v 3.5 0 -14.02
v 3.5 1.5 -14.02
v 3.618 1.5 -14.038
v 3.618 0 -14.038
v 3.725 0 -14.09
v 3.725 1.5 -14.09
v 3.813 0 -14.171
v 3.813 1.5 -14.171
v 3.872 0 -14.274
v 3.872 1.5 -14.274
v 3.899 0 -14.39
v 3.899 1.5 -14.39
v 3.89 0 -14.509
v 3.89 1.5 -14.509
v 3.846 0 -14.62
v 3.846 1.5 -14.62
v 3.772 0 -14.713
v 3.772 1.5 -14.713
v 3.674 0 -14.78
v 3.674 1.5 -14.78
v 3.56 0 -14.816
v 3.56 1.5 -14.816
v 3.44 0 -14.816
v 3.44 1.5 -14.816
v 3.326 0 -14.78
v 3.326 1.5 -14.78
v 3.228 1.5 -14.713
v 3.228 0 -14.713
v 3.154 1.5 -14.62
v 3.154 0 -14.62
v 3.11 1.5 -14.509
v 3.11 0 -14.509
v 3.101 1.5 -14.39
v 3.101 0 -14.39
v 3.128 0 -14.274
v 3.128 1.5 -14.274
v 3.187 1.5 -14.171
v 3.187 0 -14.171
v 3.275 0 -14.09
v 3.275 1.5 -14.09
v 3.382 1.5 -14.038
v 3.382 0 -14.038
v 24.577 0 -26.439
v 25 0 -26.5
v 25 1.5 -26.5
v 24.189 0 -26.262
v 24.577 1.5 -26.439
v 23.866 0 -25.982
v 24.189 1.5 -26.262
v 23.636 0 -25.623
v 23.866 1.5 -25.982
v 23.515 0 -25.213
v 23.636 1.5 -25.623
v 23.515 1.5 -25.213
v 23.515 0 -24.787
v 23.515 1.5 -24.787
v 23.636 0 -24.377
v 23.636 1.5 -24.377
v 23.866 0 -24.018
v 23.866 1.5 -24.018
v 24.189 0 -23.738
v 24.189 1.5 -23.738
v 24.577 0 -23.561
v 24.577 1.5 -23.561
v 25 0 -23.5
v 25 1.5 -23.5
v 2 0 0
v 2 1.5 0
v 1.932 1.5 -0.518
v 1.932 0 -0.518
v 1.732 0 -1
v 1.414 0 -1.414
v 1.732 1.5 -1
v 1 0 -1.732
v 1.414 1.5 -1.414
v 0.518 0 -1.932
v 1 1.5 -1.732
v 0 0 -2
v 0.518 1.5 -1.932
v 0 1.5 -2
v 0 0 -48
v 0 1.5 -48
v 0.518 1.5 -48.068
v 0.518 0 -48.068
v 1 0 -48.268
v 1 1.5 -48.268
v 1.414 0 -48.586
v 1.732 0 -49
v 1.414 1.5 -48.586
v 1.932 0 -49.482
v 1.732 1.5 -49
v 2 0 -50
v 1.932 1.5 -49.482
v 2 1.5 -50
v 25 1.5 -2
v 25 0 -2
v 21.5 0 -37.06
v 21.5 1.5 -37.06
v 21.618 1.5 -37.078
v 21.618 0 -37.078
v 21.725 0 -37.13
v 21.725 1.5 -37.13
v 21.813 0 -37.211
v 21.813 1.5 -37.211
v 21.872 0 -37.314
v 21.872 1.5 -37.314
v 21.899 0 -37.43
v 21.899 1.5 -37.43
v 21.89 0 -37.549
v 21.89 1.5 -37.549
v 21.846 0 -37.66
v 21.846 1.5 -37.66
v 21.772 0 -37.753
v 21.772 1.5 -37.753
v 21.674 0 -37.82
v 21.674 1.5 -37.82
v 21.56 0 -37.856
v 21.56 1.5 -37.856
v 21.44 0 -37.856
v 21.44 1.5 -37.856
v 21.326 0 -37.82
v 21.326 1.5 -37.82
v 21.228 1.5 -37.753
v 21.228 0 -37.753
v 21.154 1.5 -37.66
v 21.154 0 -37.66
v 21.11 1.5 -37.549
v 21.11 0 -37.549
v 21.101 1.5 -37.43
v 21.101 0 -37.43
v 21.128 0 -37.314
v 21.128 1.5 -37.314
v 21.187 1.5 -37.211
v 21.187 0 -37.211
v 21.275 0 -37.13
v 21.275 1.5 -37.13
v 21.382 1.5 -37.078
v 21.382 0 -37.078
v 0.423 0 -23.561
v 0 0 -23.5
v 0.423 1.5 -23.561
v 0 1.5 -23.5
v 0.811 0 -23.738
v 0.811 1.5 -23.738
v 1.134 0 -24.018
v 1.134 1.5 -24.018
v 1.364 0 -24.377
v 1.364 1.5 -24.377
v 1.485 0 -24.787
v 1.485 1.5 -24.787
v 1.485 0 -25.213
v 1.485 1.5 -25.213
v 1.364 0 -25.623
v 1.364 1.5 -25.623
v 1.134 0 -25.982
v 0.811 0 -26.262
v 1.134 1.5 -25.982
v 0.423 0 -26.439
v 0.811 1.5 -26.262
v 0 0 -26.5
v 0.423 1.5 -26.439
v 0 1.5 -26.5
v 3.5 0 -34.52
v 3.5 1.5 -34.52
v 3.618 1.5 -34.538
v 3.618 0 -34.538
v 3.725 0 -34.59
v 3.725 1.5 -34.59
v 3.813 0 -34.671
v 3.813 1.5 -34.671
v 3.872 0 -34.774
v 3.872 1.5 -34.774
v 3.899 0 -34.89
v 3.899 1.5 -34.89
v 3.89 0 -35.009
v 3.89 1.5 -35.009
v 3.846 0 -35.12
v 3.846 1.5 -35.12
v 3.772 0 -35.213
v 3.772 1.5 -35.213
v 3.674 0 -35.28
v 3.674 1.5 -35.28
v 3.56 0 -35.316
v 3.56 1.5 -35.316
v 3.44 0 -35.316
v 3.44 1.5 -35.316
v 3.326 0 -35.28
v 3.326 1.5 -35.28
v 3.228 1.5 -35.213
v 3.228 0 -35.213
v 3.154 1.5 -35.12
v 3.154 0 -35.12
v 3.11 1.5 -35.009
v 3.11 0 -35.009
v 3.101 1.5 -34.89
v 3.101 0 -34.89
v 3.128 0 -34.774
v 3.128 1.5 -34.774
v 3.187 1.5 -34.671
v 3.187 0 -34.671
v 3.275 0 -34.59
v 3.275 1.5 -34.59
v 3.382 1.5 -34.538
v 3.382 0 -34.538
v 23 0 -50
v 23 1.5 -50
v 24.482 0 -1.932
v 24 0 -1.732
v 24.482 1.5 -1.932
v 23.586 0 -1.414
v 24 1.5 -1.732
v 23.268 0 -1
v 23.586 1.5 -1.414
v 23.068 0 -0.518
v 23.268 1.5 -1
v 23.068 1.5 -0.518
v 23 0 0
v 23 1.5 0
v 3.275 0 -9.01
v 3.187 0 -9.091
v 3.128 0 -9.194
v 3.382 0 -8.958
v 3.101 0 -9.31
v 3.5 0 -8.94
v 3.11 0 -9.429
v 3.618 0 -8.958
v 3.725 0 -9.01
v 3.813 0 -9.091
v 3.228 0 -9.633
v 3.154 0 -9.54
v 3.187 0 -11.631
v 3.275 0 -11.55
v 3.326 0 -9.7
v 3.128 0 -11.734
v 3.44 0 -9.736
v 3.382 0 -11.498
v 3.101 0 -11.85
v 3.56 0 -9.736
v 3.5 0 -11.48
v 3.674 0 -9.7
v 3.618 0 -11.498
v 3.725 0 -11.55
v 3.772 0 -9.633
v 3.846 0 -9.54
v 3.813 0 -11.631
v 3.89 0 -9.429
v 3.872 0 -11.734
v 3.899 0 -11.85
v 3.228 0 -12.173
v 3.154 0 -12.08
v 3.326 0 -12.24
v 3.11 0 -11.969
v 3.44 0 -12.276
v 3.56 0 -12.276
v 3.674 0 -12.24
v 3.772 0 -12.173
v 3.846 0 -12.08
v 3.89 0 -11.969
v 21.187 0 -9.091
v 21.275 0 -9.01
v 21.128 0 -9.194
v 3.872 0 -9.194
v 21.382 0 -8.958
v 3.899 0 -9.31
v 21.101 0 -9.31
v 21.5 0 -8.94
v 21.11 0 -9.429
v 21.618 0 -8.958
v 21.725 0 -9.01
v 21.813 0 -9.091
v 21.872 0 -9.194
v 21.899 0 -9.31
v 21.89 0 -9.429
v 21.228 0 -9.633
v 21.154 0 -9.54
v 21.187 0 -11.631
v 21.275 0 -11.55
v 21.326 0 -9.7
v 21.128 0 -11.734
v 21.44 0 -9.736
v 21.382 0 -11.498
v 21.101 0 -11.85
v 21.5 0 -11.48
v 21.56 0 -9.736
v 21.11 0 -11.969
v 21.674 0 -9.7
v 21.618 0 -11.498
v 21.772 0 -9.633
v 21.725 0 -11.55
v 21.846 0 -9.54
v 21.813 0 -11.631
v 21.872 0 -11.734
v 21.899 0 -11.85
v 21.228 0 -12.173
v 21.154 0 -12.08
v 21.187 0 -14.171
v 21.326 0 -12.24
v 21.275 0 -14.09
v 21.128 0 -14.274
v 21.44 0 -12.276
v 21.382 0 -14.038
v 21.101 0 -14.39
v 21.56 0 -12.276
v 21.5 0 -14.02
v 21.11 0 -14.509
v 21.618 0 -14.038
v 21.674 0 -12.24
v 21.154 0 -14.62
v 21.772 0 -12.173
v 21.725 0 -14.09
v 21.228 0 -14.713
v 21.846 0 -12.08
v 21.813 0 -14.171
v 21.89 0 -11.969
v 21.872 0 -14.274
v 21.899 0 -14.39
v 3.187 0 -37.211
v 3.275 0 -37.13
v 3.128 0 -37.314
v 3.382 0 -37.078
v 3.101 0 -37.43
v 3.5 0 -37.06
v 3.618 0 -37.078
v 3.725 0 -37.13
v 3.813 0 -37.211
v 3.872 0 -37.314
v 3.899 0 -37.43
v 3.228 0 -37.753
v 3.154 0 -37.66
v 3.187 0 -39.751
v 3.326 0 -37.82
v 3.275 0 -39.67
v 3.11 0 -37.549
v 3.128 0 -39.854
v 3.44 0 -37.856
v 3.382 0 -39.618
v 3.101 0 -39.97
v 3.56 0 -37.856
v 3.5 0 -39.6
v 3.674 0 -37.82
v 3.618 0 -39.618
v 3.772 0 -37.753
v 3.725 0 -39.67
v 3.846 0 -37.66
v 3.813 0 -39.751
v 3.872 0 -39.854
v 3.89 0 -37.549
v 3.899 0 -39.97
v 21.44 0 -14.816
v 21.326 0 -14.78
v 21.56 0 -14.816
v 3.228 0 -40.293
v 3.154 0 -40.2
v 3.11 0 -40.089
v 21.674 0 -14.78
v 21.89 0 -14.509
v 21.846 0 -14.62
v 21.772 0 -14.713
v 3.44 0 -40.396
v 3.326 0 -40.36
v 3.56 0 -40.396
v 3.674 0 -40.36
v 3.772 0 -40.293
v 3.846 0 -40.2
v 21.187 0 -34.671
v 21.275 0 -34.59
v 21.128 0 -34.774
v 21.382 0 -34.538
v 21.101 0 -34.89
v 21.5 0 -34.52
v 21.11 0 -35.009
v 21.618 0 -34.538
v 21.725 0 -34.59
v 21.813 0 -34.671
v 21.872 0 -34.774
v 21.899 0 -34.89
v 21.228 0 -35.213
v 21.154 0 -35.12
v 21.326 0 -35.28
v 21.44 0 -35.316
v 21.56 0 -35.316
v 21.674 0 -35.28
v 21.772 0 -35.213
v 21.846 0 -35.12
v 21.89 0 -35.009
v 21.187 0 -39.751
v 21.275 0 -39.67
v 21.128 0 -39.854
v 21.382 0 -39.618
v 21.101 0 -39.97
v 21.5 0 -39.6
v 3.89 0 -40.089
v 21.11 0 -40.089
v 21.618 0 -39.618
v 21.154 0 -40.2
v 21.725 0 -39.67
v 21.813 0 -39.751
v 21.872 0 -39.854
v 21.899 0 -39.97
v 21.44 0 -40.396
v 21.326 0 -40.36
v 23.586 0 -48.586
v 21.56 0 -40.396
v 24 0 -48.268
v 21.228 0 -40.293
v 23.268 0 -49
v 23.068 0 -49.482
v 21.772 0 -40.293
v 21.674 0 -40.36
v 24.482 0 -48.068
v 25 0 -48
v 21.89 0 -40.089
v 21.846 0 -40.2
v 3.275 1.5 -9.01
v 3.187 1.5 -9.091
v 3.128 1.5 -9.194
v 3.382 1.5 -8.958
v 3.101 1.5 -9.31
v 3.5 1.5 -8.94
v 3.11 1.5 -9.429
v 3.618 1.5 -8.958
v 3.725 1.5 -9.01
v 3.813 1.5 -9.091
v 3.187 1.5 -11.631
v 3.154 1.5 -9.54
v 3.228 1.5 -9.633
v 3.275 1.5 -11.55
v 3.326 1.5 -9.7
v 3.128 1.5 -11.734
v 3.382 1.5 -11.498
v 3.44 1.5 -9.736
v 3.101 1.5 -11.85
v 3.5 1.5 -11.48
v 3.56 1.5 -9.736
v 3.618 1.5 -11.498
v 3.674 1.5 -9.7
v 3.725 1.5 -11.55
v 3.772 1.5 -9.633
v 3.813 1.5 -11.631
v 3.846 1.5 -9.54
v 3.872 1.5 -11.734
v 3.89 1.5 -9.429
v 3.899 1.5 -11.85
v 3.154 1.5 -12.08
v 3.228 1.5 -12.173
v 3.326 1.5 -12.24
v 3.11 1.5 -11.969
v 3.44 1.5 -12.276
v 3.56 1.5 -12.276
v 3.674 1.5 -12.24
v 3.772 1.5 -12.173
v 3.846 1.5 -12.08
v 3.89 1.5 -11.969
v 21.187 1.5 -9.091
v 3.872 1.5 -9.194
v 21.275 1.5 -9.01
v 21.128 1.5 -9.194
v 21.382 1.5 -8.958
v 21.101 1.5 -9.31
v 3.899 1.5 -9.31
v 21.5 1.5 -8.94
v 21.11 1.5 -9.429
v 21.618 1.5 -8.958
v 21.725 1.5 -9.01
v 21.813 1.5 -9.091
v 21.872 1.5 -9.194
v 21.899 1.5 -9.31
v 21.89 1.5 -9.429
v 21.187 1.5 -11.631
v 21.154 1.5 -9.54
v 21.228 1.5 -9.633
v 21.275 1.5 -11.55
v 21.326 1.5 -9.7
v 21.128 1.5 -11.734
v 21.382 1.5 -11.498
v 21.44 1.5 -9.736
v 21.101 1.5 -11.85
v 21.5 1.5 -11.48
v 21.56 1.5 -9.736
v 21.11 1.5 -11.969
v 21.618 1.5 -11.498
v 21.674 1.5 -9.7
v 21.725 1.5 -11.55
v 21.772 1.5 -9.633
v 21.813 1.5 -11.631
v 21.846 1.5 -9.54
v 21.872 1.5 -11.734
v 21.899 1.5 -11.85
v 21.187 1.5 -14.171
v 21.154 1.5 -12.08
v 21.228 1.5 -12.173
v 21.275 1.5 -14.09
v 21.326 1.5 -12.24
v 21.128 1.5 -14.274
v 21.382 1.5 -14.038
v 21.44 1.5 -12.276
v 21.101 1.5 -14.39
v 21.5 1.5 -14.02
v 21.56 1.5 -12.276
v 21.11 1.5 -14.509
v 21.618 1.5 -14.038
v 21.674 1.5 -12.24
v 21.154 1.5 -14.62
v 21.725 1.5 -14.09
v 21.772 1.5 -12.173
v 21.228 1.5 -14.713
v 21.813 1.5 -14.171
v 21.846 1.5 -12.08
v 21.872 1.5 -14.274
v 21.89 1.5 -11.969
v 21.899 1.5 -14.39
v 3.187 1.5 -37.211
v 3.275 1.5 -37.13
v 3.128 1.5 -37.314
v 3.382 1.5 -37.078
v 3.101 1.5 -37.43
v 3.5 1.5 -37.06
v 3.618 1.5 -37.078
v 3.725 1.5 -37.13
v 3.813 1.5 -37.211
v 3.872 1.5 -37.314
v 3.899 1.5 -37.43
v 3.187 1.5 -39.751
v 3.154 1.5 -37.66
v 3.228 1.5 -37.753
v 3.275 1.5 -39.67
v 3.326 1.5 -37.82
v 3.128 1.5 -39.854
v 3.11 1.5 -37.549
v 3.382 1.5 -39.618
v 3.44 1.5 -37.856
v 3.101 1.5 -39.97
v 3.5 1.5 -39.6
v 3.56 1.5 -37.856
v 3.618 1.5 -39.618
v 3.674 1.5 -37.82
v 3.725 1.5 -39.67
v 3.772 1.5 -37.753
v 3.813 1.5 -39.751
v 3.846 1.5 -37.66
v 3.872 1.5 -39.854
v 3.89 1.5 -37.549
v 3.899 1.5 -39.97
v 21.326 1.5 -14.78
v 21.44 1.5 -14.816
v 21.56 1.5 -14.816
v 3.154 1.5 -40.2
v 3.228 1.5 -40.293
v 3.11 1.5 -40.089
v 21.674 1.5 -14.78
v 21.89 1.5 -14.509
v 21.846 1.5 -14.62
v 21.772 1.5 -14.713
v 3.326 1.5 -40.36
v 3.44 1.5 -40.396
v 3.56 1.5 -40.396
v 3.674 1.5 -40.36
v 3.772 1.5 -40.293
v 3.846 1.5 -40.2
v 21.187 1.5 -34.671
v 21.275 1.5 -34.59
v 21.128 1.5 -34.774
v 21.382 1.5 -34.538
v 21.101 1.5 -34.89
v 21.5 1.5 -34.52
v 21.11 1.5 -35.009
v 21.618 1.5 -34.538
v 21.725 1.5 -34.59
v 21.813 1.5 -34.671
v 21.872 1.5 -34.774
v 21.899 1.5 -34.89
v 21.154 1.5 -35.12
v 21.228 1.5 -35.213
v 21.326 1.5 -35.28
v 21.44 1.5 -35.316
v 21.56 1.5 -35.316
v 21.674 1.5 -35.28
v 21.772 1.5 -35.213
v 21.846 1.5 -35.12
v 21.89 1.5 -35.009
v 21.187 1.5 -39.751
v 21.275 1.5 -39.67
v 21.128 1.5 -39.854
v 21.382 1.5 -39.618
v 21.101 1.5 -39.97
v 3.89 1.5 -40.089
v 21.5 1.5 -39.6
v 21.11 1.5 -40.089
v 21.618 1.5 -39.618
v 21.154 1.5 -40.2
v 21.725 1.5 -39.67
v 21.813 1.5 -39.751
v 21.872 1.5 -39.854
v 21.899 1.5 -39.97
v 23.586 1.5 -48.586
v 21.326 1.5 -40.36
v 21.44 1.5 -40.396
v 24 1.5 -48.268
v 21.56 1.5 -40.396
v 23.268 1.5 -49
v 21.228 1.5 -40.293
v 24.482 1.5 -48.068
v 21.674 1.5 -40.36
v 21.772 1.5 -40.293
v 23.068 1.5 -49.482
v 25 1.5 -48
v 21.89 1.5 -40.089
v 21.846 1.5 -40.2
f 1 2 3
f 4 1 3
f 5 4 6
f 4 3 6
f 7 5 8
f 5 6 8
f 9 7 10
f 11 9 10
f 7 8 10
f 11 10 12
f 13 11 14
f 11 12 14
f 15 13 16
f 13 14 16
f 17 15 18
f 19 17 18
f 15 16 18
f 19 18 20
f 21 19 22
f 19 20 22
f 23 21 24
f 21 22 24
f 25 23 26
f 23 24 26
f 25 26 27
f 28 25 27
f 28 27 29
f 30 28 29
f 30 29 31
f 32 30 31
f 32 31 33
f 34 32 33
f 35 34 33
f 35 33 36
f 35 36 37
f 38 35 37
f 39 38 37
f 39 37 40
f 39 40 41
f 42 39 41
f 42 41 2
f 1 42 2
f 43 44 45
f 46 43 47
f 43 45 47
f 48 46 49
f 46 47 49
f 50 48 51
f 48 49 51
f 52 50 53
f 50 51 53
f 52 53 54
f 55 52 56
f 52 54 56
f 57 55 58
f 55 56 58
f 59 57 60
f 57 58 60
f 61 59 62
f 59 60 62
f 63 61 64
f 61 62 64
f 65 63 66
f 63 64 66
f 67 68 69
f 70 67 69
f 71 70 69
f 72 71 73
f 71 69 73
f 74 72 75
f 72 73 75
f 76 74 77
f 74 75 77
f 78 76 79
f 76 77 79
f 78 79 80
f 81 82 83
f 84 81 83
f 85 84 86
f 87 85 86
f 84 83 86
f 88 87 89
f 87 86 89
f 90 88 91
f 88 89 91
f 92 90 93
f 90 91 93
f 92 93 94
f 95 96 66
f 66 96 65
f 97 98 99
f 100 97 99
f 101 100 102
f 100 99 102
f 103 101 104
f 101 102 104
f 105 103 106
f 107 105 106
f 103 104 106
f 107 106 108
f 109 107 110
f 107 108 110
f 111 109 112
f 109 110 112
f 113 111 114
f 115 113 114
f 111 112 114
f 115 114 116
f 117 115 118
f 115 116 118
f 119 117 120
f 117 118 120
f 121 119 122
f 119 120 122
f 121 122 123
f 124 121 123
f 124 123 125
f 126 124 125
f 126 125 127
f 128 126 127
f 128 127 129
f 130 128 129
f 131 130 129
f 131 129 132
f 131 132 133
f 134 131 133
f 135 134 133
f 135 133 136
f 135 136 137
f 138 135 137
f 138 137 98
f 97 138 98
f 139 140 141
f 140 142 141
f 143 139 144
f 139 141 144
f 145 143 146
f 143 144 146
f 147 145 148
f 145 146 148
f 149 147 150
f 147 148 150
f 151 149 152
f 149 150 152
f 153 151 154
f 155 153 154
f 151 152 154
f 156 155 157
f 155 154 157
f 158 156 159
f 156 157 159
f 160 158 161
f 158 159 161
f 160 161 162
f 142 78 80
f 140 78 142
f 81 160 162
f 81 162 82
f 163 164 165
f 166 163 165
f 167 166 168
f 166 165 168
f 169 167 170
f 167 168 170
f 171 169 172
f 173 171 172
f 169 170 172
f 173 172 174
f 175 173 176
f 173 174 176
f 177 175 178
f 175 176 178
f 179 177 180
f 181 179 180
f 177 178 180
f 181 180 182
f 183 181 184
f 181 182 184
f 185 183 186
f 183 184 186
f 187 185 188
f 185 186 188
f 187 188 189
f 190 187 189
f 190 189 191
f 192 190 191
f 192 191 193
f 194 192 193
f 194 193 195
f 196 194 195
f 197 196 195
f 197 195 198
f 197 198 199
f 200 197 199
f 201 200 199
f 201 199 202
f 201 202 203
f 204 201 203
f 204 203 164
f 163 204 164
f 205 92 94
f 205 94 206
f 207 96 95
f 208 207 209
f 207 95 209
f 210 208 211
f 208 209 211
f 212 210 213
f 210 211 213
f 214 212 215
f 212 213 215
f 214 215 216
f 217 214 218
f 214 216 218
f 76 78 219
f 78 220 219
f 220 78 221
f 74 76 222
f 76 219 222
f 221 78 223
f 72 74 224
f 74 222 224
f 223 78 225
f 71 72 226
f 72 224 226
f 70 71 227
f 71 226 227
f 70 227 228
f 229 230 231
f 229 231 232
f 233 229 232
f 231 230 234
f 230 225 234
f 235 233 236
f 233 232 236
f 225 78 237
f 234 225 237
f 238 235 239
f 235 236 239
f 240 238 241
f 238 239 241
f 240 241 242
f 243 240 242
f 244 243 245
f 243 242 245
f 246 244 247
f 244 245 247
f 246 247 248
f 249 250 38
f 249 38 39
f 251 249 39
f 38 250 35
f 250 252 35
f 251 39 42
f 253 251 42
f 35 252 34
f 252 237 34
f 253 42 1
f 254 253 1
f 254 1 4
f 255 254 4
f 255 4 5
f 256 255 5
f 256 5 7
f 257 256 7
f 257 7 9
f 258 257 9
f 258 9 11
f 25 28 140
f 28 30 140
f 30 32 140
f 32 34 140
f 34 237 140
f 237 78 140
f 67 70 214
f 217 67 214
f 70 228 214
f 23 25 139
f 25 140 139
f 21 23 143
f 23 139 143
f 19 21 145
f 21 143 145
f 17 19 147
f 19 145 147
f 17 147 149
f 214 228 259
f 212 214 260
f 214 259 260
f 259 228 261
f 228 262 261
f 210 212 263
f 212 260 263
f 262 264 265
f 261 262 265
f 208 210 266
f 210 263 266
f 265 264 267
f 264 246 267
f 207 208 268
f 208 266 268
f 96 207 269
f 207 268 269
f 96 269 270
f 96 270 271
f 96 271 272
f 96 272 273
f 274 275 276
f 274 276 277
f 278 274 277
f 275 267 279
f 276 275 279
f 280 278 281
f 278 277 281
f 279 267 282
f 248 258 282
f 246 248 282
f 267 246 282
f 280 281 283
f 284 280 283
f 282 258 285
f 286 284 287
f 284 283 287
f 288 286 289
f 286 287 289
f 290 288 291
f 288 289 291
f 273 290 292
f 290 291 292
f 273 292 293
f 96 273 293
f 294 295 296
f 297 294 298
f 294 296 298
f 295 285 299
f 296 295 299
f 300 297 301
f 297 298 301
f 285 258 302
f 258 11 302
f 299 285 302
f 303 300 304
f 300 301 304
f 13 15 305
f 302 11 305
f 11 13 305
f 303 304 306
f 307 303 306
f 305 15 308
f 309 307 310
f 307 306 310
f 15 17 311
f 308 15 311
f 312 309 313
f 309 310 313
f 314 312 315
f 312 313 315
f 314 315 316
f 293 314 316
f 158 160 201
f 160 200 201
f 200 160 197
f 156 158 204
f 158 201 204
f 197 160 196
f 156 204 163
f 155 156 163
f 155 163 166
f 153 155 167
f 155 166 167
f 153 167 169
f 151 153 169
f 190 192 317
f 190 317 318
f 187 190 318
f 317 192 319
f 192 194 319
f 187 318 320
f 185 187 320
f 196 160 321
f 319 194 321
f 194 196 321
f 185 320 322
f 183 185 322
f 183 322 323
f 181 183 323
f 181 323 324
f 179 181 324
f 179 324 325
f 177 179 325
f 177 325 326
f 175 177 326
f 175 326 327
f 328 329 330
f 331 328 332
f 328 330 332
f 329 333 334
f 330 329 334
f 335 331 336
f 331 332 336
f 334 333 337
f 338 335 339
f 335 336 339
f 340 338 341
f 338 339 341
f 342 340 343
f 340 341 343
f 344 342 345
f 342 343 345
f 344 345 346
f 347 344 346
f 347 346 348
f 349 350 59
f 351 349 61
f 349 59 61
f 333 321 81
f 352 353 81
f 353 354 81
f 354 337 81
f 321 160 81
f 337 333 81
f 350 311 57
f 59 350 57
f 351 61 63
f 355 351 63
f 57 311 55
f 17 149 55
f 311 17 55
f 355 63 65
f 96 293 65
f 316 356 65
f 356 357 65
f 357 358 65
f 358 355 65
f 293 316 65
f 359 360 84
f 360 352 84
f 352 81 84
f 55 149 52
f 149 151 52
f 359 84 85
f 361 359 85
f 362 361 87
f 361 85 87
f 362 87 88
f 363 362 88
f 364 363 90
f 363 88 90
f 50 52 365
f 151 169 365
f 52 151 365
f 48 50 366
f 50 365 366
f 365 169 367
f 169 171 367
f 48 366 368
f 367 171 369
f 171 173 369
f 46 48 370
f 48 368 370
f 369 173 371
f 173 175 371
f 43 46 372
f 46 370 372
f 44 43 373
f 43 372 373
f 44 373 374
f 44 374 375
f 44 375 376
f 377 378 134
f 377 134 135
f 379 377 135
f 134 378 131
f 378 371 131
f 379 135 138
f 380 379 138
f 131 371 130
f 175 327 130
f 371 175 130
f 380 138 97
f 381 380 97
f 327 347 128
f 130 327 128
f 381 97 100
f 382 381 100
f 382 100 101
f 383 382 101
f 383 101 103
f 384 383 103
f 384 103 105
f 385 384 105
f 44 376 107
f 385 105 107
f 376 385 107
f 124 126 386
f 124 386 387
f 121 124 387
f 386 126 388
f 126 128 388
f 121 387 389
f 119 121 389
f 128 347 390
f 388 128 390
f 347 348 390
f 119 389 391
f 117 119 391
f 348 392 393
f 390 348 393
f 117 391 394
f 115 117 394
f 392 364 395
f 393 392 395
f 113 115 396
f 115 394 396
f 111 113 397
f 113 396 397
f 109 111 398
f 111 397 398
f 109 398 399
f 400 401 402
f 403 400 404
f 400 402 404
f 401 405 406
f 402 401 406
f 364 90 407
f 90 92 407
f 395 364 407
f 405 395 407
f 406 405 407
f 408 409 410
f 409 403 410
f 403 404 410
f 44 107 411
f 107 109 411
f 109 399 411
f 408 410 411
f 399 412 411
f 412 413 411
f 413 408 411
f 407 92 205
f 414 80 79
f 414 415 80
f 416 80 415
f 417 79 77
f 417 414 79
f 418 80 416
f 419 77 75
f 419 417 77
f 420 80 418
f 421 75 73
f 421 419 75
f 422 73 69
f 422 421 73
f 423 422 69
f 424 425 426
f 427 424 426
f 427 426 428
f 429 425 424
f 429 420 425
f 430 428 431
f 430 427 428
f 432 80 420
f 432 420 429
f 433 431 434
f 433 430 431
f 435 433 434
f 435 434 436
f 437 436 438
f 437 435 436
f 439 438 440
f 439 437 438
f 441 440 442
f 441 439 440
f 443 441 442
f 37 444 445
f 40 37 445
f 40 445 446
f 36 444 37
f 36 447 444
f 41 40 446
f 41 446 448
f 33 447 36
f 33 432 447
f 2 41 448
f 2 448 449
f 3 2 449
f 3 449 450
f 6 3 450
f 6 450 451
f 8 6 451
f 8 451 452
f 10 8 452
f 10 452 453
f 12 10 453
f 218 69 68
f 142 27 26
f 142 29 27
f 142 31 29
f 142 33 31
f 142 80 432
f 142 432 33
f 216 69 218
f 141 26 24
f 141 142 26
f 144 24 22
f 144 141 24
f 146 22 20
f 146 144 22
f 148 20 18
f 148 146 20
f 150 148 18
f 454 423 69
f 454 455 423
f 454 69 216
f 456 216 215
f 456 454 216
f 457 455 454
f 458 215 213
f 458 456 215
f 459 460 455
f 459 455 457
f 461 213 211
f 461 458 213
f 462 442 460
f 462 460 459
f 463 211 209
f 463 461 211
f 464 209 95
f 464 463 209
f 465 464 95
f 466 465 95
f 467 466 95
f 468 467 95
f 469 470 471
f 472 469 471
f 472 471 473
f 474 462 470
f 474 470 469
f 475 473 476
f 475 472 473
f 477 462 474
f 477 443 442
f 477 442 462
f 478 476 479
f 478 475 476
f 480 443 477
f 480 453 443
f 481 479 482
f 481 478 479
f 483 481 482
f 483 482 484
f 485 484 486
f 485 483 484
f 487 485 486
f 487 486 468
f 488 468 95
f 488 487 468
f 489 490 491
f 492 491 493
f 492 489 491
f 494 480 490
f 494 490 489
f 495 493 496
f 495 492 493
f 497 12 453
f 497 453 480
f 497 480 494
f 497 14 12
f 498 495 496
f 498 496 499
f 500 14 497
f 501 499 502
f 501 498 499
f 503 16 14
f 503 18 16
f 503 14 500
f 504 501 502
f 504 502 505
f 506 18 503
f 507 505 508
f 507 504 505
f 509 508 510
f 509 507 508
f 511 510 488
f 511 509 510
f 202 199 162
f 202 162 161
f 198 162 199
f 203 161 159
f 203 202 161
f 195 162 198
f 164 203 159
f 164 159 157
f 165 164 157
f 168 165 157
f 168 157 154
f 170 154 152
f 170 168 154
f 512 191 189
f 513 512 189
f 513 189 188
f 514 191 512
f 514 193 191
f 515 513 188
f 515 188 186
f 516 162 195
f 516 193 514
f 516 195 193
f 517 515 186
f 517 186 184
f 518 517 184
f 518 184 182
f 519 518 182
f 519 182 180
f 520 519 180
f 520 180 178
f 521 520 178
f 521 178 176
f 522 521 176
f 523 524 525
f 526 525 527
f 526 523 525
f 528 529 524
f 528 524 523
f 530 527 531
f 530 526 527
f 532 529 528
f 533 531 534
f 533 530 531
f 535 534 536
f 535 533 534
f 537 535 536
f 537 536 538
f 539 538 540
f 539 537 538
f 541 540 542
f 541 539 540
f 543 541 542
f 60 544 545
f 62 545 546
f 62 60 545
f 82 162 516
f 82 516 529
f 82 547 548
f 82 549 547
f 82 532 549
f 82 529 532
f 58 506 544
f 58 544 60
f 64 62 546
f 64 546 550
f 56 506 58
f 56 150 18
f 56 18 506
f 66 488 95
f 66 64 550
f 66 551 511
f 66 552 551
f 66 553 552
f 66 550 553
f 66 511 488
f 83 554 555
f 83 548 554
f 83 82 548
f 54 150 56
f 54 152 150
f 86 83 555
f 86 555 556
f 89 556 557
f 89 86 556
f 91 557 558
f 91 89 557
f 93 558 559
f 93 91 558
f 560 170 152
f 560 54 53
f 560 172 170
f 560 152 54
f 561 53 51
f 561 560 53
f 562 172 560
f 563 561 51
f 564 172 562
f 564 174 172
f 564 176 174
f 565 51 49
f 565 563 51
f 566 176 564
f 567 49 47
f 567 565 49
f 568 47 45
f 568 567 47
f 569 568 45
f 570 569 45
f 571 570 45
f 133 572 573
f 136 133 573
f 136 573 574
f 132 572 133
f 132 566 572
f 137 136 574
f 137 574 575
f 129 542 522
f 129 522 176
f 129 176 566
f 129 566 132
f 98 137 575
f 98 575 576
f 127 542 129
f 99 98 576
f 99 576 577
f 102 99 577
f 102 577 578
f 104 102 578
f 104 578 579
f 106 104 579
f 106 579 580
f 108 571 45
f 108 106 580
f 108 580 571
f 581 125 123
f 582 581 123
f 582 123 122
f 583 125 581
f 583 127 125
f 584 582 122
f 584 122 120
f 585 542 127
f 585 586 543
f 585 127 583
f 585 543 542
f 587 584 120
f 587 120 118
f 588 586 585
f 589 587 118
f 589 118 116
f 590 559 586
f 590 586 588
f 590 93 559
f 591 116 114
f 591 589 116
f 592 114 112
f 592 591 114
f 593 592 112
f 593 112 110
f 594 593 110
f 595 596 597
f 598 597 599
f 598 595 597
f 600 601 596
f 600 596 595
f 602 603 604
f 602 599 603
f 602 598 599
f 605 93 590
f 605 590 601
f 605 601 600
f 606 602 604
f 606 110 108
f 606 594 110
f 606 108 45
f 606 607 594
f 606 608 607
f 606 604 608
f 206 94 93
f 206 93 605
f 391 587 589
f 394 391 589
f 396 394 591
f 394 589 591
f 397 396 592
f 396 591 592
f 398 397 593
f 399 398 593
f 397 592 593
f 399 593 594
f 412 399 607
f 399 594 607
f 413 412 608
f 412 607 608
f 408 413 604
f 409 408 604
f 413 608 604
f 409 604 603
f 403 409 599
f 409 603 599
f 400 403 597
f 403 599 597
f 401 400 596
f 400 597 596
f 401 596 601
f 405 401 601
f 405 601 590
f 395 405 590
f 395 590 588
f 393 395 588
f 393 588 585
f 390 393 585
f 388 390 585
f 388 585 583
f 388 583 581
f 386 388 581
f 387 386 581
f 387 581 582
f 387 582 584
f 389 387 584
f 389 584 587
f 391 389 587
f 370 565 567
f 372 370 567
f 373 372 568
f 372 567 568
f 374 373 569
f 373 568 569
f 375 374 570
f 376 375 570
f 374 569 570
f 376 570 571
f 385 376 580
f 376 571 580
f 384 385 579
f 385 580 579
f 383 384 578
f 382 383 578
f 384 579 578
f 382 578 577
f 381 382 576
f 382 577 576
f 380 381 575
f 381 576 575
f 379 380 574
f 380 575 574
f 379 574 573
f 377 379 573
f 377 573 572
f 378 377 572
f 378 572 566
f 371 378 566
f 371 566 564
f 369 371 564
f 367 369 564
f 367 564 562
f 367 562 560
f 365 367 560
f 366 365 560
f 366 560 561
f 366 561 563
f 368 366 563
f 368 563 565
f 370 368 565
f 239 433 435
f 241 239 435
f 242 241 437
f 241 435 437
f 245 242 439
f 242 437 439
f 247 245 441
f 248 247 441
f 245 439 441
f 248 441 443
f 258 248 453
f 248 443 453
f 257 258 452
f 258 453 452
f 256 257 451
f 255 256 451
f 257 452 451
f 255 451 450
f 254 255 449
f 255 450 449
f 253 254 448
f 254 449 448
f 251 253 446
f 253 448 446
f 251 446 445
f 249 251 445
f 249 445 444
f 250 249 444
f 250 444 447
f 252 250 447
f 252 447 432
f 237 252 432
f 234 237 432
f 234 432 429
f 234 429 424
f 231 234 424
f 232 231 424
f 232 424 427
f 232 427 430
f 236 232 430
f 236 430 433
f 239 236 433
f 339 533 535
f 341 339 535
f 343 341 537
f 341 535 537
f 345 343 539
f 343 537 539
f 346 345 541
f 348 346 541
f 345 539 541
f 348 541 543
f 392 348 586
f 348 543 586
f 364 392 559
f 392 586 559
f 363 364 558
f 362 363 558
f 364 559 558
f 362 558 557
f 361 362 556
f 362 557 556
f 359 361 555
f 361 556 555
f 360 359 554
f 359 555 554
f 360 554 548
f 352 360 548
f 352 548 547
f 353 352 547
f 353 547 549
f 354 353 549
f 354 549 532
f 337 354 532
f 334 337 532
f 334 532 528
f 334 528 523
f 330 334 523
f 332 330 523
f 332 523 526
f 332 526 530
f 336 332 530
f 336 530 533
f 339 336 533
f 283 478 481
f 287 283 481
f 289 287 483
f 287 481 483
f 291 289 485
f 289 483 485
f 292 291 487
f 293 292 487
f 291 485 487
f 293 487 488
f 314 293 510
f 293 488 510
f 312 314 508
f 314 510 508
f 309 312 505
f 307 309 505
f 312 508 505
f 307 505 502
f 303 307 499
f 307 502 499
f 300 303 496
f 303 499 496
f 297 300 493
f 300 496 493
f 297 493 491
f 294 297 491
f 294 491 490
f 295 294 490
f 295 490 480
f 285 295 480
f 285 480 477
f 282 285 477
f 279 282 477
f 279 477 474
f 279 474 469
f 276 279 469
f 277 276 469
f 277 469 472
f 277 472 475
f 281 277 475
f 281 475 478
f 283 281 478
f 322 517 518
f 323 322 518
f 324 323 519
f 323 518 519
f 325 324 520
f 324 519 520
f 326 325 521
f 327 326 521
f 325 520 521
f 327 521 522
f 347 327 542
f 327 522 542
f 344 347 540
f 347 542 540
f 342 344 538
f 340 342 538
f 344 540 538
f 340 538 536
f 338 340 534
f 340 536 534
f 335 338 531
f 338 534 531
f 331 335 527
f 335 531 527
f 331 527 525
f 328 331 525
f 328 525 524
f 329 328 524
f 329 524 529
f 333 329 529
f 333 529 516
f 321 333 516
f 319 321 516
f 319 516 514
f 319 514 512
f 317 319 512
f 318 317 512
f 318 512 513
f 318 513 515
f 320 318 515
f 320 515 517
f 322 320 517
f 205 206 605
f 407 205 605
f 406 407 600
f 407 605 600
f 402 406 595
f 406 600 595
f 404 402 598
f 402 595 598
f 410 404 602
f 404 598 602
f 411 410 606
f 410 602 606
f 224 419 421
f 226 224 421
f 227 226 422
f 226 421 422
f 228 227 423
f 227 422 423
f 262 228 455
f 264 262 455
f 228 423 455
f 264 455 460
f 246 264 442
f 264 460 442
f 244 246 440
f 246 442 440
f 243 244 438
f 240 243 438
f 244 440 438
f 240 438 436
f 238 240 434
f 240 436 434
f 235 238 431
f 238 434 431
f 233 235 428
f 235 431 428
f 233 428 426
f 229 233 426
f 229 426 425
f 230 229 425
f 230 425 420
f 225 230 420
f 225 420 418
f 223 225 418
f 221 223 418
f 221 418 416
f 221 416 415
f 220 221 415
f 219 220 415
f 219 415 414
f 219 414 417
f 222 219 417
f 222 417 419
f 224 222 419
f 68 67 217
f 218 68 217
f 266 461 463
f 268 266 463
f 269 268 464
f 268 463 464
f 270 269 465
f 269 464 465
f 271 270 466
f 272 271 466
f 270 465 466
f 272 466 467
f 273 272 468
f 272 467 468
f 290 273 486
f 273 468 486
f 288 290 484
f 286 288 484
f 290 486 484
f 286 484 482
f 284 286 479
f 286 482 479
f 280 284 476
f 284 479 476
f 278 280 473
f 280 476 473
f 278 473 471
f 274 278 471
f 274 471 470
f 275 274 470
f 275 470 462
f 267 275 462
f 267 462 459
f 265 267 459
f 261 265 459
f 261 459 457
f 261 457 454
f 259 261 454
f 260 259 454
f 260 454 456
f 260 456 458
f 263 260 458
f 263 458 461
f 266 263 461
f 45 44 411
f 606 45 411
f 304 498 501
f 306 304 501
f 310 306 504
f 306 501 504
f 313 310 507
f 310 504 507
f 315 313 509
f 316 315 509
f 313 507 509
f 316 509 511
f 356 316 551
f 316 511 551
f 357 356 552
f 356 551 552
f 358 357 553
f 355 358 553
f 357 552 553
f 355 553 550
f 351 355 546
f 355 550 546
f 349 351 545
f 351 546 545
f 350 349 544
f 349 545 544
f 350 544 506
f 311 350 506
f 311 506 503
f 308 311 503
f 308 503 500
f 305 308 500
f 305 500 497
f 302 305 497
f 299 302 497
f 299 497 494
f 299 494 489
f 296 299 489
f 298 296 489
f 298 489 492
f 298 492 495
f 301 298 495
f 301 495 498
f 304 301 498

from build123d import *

# Parameters (mm, degrees)
SKETCH_1_W          = 25
SKETCH_1_H          = 50
EXTRUDE_1_DEPTH     = 1.5
SKETCH_2_R          = 1.5
SKETCH_2_R_2        = 2
SKETCH_2_R_3        = 0.4
CUT_EXTRUDE_1_DEPTH = 56.921820428


with BuildPart() as part:
    # Эскиз1 → Бобышка-Вытянуть1 (new body)
    with BuildSketch(Plane(origin=(0, 0, 0), x_dir=(1, 0, 0), z_dir=(0, 1, 0))):
        with Locations((12.5, 25)):
            Rectangle(SKETCH_1_W, SKETCH_1_H)
    extrude(amount=EXTRUDE_1_DEPTH)

    # Эскиз2 → Вырез-Вытянуть1 (cut, through all)
    with BuildSketch(Plane(origin=(0, 1.5, 0), x_dir=(1, 0, 0), z_dir=(0, 1, 0))):
        with Locations((25, 25)):
            Circle(SKETCH_2_R)
        with Locations((0, 25)):
            Circle(SKETCH_2_R)
        with Locations((25, 0)):
            Circle(SKETCH_2_R_2)
        Circle(SKETCH_2_R_2)
        with Locations((0, 50)):
            Circle(SKETCH_2_R_2)
        with Locations((25, 50)):
            Circle(SKETCH_2_R_2)
        with Locations(Location((3.5, 40, 0), (0, 0, 270))):
            Circle(SKETCH_2_R_3)
        with Locations(Location((3.5, 37.46, 0), (0, 0, 270))):
            Circle(SKETCH_2_R_3)
        with Locations(Location((3.5, 34.92, 0), (0, 0, 270))):
            Circle(SKETCH_2_R_3)
        with Locations(Location((3.5, 14.42, 0), (0, 0, 270))):
            Circle(SKETCH_2_R_3)
        with Locations(Location((3.5, 11.88, 0), (0, 0, 270))):
            Circle(SKETCH_2_R_3)
        with Locations(Location((3.5, 9.34, 0), (0, 0, 270))):
            Circle(SKETCH_2_R_3)
        with Locations(Location((21.5, 40, 0), (0, 0, 270))):
            Circle(SKETCH_2_R_3)
        with Locations(Location((21.5, 37.46, 0), (0, 0, 270))):
            Circle(SKETCH_2_R_3)
        with Locations(Location((21.5, 34.92, 0), (0, 0, 270))):
            Circle(SKETCH_2_R_3)
        with Locations(Location((21.5, 14.42, 0), (0, 0, 270))):
            Circle(SKETCH_2_R_3)
        with Locations(Location((21.5, 11.88, 0), (0, 0, 270))):
            Circle(SKETCH_2_R_3)
        with Locations(Location((21.5, 9.34, 0), (0, 0, 270))):
            Circle(SKETCH_2_R_3)
    extrude(amount=-CUT_EXTRUDE_1_DEPTH, mode=Mode.SUBTRACT)


solid = part.part
